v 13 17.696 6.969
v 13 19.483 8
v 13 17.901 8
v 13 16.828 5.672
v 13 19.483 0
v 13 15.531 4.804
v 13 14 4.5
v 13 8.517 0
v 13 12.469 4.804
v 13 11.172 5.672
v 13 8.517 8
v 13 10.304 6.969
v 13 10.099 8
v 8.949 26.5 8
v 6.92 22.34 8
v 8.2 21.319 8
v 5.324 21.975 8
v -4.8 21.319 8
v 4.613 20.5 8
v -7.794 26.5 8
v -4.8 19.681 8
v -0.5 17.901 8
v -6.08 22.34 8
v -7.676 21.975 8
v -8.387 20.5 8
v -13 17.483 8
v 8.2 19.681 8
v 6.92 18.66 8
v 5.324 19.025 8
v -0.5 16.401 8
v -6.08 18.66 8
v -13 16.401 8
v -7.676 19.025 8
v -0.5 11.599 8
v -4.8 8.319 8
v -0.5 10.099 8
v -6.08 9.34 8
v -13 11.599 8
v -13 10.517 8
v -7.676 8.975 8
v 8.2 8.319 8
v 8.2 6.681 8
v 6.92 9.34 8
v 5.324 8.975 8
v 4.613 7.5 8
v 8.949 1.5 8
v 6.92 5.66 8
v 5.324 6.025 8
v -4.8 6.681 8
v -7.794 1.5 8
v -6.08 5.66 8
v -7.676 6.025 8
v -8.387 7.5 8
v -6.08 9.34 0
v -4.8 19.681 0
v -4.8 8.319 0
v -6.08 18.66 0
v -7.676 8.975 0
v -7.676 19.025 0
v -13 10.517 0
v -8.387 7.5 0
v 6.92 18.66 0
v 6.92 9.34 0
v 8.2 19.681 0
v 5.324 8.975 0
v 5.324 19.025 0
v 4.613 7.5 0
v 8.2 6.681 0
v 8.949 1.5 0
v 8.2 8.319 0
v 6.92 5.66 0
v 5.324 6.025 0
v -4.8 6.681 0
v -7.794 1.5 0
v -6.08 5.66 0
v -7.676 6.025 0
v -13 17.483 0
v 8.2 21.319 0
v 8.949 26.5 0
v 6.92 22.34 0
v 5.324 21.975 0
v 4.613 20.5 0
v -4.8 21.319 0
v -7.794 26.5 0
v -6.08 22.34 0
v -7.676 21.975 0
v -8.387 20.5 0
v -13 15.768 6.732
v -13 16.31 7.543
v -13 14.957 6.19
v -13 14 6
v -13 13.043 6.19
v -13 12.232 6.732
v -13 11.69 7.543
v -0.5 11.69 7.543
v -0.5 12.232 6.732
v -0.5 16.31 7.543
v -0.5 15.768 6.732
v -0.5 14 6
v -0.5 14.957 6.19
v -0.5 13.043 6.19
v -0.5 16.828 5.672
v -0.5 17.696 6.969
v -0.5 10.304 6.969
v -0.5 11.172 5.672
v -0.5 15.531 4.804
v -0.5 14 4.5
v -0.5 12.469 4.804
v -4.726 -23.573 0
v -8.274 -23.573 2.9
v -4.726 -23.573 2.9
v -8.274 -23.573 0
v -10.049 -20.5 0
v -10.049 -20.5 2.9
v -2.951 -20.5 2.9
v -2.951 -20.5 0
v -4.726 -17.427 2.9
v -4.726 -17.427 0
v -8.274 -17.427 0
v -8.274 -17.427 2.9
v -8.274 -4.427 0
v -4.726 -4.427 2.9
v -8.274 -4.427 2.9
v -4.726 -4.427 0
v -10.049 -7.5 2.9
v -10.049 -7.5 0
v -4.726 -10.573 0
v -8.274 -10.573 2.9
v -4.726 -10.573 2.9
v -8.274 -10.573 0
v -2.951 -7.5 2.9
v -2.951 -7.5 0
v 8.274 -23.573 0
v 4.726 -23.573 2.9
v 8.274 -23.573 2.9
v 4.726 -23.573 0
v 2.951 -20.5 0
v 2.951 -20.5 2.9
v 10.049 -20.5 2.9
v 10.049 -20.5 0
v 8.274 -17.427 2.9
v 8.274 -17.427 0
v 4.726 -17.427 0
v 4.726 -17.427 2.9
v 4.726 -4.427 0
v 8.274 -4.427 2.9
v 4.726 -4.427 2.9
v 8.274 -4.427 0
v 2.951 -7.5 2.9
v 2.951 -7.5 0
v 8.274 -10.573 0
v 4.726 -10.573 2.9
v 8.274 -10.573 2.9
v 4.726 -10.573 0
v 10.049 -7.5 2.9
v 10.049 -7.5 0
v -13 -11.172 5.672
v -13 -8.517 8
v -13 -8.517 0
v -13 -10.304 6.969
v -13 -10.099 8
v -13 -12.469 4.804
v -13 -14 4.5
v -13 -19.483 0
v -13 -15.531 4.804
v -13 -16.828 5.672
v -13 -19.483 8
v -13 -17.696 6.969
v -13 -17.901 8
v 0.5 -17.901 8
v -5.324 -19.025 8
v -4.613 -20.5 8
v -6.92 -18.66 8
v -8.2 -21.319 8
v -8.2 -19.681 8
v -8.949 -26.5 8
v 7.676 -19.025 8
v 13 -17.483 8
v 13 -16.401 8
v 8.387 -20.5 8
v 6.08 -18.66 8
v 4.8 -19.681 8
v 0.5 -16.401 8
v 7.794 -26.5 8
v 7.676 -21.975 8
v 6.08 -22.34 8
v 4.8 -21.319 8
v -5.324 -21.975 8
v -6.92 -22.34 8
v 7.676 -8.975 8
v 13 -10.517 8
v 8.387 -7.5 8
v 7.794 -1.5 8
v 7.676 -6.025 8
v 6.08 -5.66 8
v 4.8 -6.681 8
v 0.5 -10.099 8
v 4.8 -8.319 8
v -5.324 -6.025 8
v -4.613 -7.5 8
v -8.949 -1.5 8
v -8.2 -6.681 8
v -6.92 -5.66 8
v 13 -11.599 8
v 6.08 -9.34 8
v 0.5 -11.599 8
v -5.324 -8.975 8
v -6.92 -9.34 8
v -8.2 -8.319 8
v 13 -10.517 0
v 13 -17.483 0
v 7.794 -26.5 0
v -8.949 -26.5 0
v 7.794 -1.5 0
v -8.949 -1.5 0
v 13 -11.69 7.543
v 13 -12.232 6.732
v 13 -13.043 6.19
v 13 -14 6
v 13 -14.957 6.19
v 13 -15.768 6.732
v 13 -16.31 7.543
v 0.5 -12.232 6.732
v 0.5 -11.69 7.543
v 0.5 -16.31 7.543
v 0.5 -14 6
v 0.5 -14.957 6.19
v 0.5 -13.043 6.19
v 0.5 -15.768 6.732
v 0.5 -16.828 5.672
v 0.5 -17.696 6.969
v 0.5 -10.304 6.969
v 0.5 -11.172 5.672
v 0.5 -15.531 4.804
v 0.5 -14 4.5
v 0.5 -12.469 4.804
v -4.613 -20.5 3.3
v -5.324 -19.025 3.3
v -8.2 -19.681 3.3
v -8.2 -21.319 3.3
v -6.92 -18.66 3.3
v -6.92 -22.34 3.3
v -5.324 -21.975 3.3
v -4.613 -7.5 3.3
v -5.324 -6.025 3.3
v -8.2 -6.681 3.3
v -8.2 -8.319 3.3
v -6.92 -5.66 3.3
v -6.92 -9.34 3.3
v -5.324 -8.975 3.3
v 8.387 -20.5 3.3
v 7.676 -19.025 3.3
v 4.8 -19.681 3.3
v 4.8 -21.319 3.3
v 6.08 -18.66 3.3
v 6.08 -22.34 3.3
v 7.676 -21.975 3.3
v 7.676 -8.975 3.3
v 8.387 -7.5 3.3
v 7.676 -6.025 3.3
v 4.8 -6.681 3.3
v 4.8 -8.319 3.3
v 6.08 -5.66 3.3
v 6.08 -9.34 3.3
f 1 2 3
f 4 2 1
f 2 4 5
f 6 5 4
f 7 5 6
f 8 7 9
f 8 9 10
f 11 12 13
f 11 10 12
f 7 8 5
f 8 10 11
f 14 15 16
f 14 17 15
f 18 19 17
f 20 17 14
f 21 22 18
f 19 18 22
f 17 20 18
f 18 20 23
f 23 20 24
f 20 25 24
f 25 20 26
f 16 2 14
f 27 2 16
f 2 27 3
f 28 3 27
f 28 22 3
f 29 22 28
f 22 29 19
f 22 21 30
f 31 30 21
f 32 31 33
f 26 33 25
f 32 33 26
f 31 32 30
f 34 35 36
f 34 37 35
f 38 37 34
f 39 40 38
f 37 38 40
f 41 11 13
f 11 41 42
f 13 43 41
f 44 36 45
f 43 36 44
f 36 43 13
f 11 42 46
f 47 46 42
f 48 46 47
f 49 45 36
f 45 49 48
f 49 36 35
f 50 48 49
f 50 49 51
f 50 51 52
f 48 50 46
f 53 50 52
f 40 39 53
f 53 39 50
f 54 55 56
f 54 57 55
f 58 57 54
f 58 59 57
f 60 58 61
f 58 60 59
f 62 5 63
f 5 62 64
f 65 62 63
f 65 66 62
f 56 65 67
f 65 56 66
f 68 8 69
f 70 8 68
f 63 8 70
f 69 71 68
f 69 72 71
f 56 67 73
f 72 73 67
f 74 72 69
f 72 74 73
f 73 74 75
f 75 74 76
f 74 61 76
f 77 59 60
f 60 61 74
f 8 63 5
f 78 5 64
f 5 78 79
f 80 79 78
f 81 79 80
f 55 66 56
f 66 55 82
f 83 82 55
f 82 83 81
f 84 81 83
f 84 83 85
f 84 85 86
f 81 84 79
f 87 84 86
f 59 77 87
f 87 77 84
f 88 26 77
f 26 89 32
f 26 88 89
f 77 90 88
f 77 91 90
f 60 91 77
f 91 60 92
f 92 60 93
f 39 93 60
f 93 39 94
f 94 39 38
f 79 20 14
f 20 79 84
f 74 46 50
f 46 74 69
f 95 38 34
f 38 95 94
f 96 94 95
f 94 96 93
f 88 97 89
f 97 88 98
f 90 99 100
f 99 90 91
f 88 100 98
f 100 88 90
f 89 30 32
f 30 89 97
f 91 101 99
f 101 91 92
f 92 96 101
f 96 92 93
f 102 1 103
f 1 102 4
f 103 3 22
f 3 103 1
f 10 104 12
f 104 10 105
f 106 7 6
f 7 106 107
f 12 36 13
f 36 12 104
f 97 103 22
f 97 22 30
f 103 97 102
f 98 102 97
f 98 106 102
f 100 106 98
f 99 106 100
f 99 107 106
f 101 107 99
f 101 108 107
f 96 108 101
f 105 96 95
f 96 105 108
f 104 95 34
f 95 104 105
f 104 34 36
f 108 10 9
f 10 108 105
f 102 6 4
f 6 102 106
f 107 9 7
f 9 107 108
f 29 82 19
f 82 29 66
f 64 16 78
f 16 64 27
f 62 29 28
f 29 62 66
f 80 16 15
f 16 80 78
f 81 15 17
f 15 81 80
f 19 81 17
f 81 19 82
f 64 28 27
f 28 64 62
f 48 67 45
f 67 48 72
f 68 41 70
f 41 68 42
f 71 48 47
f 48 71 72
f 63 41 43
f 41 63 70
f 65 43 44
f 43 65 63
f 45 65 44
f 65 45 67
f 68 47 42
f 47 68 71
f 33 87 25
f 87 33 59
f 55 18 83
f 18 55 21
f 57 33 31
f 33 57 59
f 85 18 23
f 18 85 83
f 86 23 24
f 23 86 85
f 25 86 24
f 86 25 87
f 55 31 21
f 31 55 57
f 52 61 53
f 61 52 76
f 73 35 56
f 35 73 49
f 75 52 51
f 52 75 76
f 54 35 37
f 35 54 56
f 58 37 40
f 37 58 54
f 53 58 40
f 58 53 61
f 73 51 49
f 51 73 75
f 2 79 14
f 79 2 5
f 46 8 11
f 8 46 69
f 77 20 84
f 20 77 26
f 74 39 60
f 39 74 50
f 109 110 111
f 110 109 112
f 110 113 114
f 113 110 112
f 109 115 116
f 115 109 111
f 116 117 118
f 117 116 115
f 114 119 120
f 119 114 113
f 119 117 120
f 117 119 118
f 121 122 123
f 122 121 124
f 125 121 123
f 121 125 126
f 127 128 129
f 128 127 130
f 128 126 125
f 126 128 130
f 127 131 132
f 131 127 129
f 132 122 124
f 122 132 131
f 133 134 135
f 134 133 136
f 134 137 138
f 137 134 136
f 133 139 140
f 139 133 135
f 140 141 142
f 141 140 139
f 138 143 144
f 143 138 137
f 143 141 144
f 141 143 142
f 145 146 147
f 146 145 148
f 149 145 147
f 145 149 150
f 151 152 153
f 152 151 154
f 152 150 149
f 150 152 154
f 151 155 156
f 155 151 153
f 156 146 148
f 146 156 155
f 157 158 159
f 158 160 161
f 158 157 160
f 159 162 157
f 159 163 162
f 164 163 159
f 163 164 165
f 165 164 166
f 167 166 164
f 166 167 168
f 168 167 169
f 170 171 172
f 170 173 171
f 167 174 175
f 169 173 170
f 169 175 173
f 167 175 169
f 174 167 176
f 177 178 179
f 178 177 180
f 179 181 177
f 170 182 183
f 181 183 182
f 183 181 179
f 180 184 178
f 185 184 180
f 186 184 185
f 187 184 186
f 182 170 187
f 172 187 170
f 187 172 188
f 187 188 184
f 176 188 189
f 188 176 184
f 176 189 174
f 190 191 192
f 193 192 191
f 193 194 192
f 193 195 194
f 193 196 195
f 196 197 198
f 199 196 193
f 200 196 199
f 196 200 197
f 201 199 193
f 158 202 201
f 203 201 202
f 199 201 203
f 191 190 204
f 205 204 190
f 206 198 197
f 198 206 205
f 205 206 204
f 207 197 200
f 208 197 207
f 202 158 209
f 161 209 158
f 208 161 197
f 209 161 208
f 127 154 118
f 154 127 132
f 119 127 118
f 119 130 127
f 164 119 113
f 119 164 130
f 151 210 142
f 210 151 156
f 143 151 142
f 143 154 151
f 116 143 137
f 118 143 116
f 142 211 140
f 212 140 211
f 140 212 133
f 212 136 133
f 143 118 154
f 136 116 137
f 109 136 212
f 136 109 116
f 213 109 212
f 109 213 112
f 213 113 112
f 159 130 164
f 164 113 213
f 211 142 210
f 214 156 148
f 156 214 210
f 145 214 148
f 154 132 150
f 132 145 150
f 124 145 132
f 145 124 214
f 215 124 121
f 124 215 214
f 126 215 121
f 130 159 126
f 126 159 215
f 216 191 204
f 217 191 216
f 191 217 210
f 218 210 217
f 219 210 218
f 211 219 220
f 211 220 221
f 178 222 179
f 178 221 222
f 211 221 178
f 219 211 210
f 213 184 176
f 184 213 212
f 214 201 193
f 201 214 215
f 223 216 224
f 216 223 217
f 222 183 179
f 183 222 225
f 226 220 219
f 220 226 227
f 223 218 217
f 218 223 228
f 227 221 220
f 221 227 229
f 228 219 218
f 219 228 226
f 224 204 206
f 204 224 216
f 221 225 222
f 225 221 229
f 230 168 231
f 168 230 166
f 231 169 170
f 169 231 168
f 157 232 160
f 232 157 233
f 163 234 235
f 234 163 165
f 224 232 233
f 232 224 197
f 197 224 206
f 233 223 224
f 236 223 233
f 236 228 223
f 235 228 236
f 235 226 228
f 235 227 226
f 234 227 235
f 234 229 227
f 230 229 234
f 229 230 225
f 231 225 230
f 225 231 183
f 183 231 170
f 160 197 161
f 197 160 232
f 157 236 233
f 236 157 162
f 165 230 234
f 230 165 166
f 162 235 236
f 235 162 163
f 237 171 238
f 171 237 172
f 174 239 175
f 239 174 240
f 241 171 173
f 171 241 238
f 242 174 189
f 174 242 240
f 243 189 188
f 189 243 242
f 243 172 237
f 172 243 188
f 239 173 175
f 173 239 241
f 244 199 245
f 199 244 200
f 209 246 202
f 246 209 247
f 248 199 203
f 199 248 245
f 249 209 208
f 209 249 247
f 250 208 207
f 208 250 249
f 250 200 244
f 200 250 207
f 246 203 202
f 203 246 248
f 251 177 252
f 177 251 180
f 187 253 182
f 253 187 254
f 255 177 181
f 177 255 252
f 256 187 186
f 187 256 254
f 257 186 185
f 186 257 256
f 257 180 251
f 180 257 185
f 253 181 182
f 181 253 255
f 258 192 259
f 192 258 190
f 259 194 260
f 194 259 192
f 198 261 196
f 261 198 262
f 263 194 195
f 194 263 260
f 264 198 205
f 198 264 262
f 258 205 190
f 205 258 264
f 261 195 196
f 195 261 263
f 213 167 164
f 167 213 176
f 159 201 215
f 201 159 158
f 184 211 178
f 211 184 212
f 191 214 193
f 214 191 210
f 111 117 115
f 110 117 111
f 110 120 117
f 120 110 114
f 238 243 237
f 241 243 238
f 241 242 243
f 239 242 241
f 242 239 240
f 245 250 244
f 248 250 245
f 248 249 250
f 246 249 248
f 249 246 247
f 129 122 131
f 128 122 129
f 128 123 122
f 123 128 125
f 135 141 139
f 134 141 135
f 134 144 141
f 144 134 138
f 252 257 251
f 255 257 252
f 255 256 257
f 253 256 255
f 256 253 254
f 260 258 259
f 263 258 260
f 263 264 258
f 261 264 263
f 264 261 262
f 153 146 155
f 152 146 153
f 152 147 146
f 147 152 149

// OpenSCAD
// file: parameters.scad
// Parameters file for RepRap Huxley

pi=3.14159265;

// The relative location in your file system where the .dxf files are
// DXFs are for quick development.  They should be replaced by parameterised CSG in dure course.

fileroot="DXF-files/";

rodsize = 6;	//threaded/smooth rod diameter in mm
xaxis = 182.5;	//width of base in mm
yaxis = 266.5;	//length of base in mm


screwsize = 3;	//bearing bore/screw diameter in mm
bearingsize = 10;	//outer diameter of bearings in mm
bearingwidth = 4;	//width of bearings in mm


rodpitch = rodsize / 6;
rodnutsize = 0.8 * rodsize; //4.8
rodwashersize = 0.2 * rodsize; //1.2
rodwasherdiameter = 2 * rodsize;//12
screwpitch = screwsize / 6;
nutsize = 0.8 * screwsize;
nutdiameter = 1.9 * screwsize;
washersize = 0.2 * screwsize;
washerdiameter = 2 * screwsize;
partthick = 2 * (rodsize+1); //12
vertexrodspace = 2 * rodsize; //12


c = [0.3, 0.3, 0.3];
rodendoffset = rodnutsize + rodwashersize * 2 + partthick / 2;//13.2
vertexoffset = vertexrodspace + rodendoffset;//25.2
//vertexoffset = 22;

renderrodthreads = false;
renderscrewthreads = false;
fn = 36;

// The gap between the joining rods at a vertex

vertex_radius=sqrt(rodsize*rodsize + vertexoffset*vertexoffset);
vertex_ang = atan(vertexoffset/rodsize)-30;
vertex_gap = 2*vertex_radius*cos(vertex_ang);

// Nema 14 dimensions - these are absolute

nema14_square=35.3;
nema14_screws=26;
nema14_screw_r=1.5;
nema14_hub=22;
nema14_hub_depth=2;
nema14_length=36;
nema14_shaft=5;
nema14_shaft_length=66;
nema14_shaft_projection=19;

// Nema 11 dimensions - these are absolute

nema11_square=28.5;
nema11_screws=23;
nema11_screw_r=1.25;
nema11_hub=22;
nema11_hub_depth=2;
nema11_length=44.5;
nema11_shaft=5;
nema11_shaft_length=78;
nema11_shaft_projection=18;

// Limit switch parameters

limit_switch_hole_diameter=2.5;
limit_switch_centres=9.5;

// The RepRap slide bearings

bearing_mount_centres=18;
bearing_width=7;

// X axis parameters - many should be relative

x_bar_gap=30;
motor_center_y = 26;
bar_clamp_x=5;
bar_clamp_y=8;
bar_clamp_x_gap=23;
bearing_y=50;
bearing_x=bar_clamp_x_gap + 10;
hole_land=4;
thickness=5;
bearing_low_z = 8;
bearing_z_gap = 25;
bearing_plate_width = bearing_mount_centres+2*hole_land + 10;
bearing_plate_overlap=0.5;
bearing_plate_support=10;
// file: configuration.scad
// eMAKEr Huxley
// Configuration file
// GNU GPL v3
// Jean-Marc Giacalone
// info@emakershop.com
// www.emakershop.com
// http://www.reprap.org/wiki/EMAKER_Huxley
// http://github.com/jmgiacalone/eMAKERHuxley

use <library.scad>

//Round corner diameter
round_corner_diameter = 8;

//Thin wall size
layer_height = 0.4;
perimeter_width_over_thicknes = 1.6;
infill_widht_over_thickness = 1.55;
thin_wall = 2*(perimeter_width_over_thicknes*layer_height+infill_widht_over_thickness*layer_height);
if(thin_wall<2){
	echo("Check thin wall size, its below 2mm!");
}
echo(thin_wall);

// MINI-HUXLEY VERSION (TODO, just place holder)
// include <configuration-huxley.scad>
m8_diameter=8.3;
m5_diameter=5.3;
m4_diameter=4.3;
m3_diameter=3.3;
m3_dia_clr=3.5;
m3_nut = 2.8;
m3_af = 5.8;
m6_diameter = 6;
m6_nut = 11.5;
bushing_diameter = 8;
motor_shaft=5.3;
bushing_rodsize = 6;
bushing_outerDiameter = 12;
bushing_lenght = 8;

// Some basic functions, probably should be somewhere else
// main file
include <configuration.scad>

holeX = 6.5;
holeY = 6.5;

holeR = 3.4 / 2;
nutR = 5.8/sqrt(3)+0.2;
//nutR=3.25;
nutH = 3;
corner_cut = 24;

studding_dia = 5.0;
shaft_dia = 8.0;

module coupling(c){
    translate([0,0,4]) union(){
        difference(){
            cube(size = [26,25,8], center = true);

            if(c==1){
                //slot
            	*cube(size = [2,40,30], center = true);
                
                //nut holes
            	translate([ holeX,  holeY, nutH/2 - 4.01]) cylinder(h = nutH, r=nutR, $fn=6, center=true);
            	translate([ holeX, -holeY, nutH/2 - 4.01]) cylinder(h = nutH, r=nutR, $fn=6, center=true);
            	translate([-holeX,  holeY, nutH/2 - 4.01]) cylinder(h = nutH, r=nutR, $fn=6, center=true);
            	translate([-holeX, -holeY, nutH/2 - 4.01]) cylinder(h = nutH, r=nutR, $fn=6, center=true);
            }

            //shaft groves
            translate([ -16, 0, 4.5]) rotate([0,90,0]) cylinder(h = 16, r=studding_dia / 2, $fn=16);
            translate([-0.5, 0, 4.5]) rotate([0,90,0]) cylinder(h = 16, r=shaft_dia / 2,    $fn=16);

            //screw holes
            //translate([ holeX,  holeY, -10]) cylinder(h = 20, r=holeR, $fn=16);
            //translate([ holeX, -holeY, -10]) cylinder(h = 20, r=holeR, $fn=16);
            //translate([-holeX,  holeY, -10]) cylinder(h = 20, r=holeR, $fn=16);
            //translate([-holeX, -holeY, -10]) cylinder(h = 20, r=holeR, $fn=16);
            translate([ holeX,  holeY, -10]) polyhole(h = 20, d=holeR*2);
            translate([ holeX,  -holeY, -10]) polyhole(h = 20, d=holeR*2);
            translate([ -holeX,  holeY, -10]) polyhole(h = 20, d=holeR*2);
            translate([ -holeX,  -holeY, -10]) polyhole(h = 20, d=holeR*2);


            //corners
            rotate([0,0,30])   translate([corner_cut, 0, 0]) cube(size = [20,40,20], center = true);
            rotate([0,0,-30])  translate([corner_cut, 0, 0]) cube(size = [20,40,20], center = true);
            rotate([0,0,150])  translate([corner_cut-1, 0, 0]) cube(size = [20,40,20], center = true);
            rotate([0,0,-150]) translate([corner_cut-1, 0, 0]) cube(size = [20,40,20], center = true);
        }
        if(c==1){
            // bridge
        	translate([ holeX,  holeY, nutH-3.9]) cylinder(h = 0.4, r=nutR+0.1, $fn=6, center=true);
        	translate([ holeX, -holeY, nutH-3.9]) cylinder(h = 0.4, r=nutR+0.1, $fn=6, center=true);
        	translate([-holeX,  holeY, nutH-3.9]) cylinder(h = 0.4, r=nutR+0.1, $fn=6, center=true);
        	translate([-holeX, -holeY, nutH-3.9]) cylinder(h = 0.4, r=nutR+0.1, $fn=6, center=true);
        }
    }
}

translate([0, 14, 0]) coupling(c=0);
translate([0, -14, 0]) rotate([0,0,180]) coupling(c=1);
